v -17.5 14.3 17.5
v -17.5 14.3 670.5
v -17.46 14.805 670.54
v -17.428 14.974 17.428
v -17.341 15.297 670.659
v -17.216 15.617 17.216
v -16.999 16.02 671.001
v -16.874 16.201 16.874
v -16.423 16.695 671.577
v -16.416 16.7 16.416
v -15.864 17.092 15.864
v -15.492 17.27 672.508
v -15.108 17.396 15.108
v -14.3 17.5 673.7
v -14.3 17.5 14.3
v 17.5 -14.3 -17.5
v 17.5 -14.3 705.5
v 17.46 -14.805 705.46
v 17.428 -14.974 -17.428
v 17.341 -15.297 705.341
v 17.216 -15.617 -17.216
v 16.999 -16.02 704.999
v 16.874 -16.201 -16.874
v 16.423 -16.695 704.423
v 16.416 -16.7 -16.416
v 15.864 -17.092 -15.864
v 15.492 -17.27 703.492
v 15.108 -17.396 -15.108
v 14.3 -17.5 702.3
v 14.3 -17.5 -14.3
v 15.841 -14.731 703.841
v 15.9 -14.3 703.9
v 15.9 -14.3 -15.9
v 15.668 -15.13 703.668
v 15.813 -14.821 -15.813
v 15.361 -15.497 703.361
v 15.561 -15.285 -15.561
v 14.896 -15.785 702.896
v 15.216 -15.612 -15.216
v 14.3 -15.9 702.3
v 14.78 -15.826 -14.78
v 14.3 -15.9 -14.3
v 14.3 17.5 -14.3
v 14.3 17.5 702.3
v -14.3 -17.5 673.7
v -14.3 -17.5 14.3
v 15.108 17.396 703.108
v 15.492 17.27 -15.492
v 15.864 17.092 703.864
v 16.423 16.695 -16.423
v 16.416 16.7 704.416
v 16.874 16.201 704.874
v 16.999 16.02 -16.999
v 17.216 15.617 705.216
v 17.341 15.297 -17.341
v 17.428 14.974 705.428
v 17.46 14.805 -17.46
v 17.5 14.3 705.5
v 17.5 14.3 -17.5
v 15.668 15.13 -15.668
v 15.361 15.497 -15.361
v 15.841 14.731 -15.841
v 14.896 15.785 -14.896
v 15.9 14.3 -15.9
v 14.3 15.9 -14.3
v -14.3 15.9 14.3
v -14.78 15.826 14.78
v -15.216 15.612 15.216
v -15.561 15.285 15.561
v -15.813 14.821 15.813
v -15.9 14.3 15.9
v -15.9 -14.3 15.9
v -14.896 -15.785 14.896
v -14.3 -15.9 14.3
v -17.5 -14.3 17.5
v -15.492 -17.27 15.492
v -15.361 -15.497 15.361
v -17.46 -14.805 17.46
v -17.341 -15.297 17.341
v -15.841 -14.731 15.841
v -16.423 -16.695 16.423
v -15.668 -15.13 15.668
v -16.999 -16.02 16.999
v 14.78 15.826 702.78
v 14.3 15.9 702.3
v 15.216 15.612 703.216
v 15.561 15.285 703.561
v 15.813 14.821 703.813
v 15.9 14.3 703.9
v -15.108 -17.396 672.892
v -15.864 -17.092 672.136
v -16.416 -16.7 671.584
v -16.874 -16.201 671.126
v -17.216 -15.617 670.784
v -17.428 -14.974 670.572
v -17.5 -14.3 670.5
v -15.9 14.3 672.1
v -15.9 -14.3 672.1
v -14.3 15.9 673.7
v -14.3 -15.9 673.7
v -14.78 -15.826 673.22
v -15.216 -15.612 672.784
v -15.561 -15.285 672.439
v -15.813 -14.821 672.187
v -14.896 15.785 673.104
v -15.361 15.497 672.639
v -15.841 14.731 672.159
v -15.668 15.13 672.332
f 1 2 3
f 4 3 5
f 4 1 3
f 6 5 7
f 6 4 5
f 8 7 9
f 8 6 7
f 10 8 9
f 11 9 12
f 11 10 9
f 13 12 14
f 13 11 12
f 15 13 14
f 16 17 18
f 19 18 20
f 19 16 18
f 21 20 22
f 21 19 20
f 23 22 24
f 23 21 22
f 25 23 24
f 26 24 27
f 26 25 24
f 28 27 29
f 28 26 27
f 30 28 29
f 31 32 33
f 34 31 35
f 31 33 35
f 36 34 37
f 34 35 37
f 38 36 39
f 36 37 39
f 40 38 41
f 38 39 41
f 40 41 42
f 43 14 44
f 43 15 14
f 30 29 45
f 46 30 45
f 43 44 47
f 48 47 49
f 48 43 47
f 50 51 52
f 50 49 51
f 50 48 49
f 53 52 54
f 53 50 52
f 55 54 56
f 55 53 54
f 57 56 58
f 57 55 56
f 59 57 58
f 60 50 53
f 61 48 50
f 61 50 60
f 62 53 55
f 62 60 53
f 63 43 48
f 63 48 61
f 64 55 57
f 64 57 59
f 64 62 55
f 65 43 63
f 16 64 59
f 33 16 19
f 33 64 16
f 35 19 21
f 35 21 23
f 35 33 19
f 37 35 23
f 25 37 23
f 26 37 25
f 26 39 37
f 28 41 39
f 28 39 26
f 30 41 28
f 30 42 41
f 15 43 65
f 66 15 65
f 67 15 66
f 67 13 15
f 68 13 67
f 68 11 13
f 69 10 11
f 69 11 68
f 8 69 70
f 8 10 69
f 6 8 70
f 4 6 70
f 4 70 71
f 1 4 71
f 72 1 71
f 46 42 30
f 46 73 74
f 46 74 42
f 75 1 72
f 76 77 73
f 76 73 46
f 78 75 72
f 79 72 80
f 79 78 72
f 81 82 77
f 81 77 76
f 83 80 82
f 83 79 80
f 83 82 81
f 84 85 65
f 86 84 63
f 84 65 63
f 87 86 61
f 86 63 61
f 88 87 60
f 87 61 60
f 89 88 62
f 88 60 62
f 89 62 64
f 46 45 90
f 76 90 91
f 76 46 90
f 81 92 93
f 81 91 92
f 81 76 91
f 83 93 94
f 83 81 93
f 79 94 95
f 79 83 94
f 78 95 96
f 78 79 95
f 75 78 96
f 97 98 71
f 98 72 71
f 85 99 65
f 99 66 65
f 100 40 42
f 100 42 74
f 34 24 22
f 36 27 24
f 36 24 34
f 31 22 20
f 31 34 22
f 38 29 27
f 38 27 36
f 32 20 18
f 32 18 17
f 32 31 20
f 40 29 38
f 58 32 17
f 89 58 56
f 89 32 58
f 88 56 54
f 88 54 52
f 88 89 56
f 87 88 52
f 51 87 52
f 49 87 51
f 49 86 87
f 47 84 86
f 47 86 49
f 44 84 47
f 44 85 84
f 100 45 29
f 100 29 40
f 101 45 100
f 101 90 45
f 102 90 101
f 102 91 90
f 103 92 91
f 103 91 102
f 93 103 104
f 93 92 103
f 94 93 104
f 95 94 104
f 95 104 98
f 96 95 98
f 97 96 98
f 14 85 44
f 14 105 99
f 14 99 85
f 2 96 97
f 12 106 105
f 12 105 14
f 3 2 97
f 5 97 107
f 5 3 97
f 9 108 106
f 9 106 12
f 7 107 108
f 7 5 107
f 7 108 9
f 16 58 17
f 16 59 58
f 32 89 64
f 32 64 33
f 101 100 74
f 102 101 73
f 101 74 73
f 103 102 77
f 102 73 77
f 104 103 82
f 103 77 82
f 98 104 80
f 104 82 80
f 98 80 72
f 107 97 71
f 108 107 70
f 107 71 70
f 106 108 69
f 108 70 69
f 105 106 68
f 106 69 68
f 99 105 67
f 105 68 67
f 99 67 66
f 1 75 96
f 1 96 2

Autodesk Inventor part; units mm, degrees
ref_plane "Start plane" through (0, 0, -17.5) normal (0, 0, 1) x (1, 0, 0)
ref_plane "End plane" through (0, 0, 705.5) normal (0, 0, 1) x (1, 0, 0)
sketch "Sketch" plane through (0, 0, 0) normal (0, 0, 1) x (1, 0, 0)
  line L0 (-17.5, -14.3) -> (-17.5, 14.3)
  line L1 (-14.3, 17.5) -> (14.3, 17.5)
  line L2 (17.5, 14.3) -> (17.5, -14.3)
  line L3 (14.3, -17.5) -> (-14.3, -17.5)
  arc A0 (-17.5, -14.3) -> (-14.3, -17.5) centre (-14.3, -14.3) ccw
  arc A1 (-14.3, 17.5) -> (-17.5, 14.3) centre (-14.3, 14.3) ccw
  arc A2 (17.5, 14.3) -> (14.3, 17.5) centre (14.3, 14.3) ccw
  arc A3 (14.3, -17.5) -> (17.5, -14.3) centre (14.3, -14.3) ccw
  arc A4 (-14.3, 15.9) -> (-15.9, 14.3) centre (-14.3, 14.3) ccw
  line L4 (-14.3, 15.9) -> (14.3, 15.9)
  arc A5 (15.9, 14.3) -> (14.3, 15.9) centre (14.3, 14.3) ccw
  line L5 (15.9, 14.3) -> (15.9, -14.3)
  arc A6 (14.3, -15.9) -> (15.9, -14.3) centre (14.3, -14.3) ccw
  line L6 (14.3, -15.9) -> (-14.3, -15.9)
  arc A7 (-15.9, -14.3) -> (-14.3, -15.9) centre (-14.3, -14.3) ccw
  line L7 (-15.9, -14.3) -> (-15.9, 14.3)
  line L8 (0, 25.4278) -> (0, -25.4278) construction
  line L9 (-25.4278, 0) -> (25.4278, 0) construction
  dimension "d7" = 3.2
  dimension "d10" = 35
  dimension "d11" = 35
  dimension "d12" = 1.6
  dimension "d15" = 17.5
  dimension "d16" = 17.5
extrude "Body" add sketch "Sketch" along normal up to surface (723 mm away) from surface at -17.5
sketch "Sketch3" plane through (0, 0, 0) normal (0, 0, 1) x (1, 0, 0)
  line L0 (0, 0) -> (10, 0)
ref_plane "Work Plane3" through (0, 0, 0) normal (0, -1, 0) x (1, 0, 0)
sketch "Sketch4" plane through (0, 0, 0) normal (0, -1, 0) x (1, 0, 0)
  line L0 (-2, -17.5) -> (12, -17.5)
  line L1 (-2, 705.5) -> (12, 705.5)
  dimension "d18" = 723
ref_plane "Work Plane20" through (-20.2643, 0, 0.3072) normal (-0.871, 0, -0.4912) x (-0.4912, 0, 0.871)
split "Split5" plane through (-20.2643, 0, 0.3072) removes the side toward (-0.871, 0, -0.4912)
ref_plane "Work Plane21" through (-20.2643, 0, 687.6928) normal (-0.871, 0, 0.4912) x (0.4912, 0, 0.871)
split "Split6" plane through (-20.2643, 0, 687.6928) removes the side toward (-0.871, 0, 0.4912)
ref_plane "Work Plane22" through (17.5, 0, 705.5) normal (-0.7071, 0, 0.7071) x (0.7071, 0, 0.7071)
split "Split7" plane through (17.5, 0, 705.5) removes the side toward (-0.7071, 0, 0.7071)
ref_plane "Work Plane23" through (17.5, 0, -17.5) normal (-0.7071, 0, -0.7071) x (-0.7071, 0, 0.7071)
split "Split8" plane through (17.5, 0, -17.5) removes the side toward (-0.7071, 0, -0.7071)
equation "\"d7\" = G_IR"
equation "\"d10\" = G_H"
equation "\"d11\" = G_W"
equation "\"d12\" = G_T"
equation "\"d15\" = 0.5 * d10"
equation "\"d16\" = 0.5 * d11"
equation "\"d3\" = G_L"
equation "\"G_W\" = 35"
equation "\"G_H\" = 35"
equation "\"G_T\" = 1.6"
equation "\"G_IR\" = 3.2"
equation "\"G_L\" = d18"
equation "\"G_OFFSET_START\" = 17.5"
equation "\"G_OFFSET_END\" = 17.5"
equation "\"d13\" = -G_OFFSET_START"
equation "\"d14\" = G_OFFSET_END + B_L"
equation "\"B_L\" = 688"
properties part number "AS 1163 - C350L0 35x35x1.6 SHS - 723" material "Steel, Mild"
